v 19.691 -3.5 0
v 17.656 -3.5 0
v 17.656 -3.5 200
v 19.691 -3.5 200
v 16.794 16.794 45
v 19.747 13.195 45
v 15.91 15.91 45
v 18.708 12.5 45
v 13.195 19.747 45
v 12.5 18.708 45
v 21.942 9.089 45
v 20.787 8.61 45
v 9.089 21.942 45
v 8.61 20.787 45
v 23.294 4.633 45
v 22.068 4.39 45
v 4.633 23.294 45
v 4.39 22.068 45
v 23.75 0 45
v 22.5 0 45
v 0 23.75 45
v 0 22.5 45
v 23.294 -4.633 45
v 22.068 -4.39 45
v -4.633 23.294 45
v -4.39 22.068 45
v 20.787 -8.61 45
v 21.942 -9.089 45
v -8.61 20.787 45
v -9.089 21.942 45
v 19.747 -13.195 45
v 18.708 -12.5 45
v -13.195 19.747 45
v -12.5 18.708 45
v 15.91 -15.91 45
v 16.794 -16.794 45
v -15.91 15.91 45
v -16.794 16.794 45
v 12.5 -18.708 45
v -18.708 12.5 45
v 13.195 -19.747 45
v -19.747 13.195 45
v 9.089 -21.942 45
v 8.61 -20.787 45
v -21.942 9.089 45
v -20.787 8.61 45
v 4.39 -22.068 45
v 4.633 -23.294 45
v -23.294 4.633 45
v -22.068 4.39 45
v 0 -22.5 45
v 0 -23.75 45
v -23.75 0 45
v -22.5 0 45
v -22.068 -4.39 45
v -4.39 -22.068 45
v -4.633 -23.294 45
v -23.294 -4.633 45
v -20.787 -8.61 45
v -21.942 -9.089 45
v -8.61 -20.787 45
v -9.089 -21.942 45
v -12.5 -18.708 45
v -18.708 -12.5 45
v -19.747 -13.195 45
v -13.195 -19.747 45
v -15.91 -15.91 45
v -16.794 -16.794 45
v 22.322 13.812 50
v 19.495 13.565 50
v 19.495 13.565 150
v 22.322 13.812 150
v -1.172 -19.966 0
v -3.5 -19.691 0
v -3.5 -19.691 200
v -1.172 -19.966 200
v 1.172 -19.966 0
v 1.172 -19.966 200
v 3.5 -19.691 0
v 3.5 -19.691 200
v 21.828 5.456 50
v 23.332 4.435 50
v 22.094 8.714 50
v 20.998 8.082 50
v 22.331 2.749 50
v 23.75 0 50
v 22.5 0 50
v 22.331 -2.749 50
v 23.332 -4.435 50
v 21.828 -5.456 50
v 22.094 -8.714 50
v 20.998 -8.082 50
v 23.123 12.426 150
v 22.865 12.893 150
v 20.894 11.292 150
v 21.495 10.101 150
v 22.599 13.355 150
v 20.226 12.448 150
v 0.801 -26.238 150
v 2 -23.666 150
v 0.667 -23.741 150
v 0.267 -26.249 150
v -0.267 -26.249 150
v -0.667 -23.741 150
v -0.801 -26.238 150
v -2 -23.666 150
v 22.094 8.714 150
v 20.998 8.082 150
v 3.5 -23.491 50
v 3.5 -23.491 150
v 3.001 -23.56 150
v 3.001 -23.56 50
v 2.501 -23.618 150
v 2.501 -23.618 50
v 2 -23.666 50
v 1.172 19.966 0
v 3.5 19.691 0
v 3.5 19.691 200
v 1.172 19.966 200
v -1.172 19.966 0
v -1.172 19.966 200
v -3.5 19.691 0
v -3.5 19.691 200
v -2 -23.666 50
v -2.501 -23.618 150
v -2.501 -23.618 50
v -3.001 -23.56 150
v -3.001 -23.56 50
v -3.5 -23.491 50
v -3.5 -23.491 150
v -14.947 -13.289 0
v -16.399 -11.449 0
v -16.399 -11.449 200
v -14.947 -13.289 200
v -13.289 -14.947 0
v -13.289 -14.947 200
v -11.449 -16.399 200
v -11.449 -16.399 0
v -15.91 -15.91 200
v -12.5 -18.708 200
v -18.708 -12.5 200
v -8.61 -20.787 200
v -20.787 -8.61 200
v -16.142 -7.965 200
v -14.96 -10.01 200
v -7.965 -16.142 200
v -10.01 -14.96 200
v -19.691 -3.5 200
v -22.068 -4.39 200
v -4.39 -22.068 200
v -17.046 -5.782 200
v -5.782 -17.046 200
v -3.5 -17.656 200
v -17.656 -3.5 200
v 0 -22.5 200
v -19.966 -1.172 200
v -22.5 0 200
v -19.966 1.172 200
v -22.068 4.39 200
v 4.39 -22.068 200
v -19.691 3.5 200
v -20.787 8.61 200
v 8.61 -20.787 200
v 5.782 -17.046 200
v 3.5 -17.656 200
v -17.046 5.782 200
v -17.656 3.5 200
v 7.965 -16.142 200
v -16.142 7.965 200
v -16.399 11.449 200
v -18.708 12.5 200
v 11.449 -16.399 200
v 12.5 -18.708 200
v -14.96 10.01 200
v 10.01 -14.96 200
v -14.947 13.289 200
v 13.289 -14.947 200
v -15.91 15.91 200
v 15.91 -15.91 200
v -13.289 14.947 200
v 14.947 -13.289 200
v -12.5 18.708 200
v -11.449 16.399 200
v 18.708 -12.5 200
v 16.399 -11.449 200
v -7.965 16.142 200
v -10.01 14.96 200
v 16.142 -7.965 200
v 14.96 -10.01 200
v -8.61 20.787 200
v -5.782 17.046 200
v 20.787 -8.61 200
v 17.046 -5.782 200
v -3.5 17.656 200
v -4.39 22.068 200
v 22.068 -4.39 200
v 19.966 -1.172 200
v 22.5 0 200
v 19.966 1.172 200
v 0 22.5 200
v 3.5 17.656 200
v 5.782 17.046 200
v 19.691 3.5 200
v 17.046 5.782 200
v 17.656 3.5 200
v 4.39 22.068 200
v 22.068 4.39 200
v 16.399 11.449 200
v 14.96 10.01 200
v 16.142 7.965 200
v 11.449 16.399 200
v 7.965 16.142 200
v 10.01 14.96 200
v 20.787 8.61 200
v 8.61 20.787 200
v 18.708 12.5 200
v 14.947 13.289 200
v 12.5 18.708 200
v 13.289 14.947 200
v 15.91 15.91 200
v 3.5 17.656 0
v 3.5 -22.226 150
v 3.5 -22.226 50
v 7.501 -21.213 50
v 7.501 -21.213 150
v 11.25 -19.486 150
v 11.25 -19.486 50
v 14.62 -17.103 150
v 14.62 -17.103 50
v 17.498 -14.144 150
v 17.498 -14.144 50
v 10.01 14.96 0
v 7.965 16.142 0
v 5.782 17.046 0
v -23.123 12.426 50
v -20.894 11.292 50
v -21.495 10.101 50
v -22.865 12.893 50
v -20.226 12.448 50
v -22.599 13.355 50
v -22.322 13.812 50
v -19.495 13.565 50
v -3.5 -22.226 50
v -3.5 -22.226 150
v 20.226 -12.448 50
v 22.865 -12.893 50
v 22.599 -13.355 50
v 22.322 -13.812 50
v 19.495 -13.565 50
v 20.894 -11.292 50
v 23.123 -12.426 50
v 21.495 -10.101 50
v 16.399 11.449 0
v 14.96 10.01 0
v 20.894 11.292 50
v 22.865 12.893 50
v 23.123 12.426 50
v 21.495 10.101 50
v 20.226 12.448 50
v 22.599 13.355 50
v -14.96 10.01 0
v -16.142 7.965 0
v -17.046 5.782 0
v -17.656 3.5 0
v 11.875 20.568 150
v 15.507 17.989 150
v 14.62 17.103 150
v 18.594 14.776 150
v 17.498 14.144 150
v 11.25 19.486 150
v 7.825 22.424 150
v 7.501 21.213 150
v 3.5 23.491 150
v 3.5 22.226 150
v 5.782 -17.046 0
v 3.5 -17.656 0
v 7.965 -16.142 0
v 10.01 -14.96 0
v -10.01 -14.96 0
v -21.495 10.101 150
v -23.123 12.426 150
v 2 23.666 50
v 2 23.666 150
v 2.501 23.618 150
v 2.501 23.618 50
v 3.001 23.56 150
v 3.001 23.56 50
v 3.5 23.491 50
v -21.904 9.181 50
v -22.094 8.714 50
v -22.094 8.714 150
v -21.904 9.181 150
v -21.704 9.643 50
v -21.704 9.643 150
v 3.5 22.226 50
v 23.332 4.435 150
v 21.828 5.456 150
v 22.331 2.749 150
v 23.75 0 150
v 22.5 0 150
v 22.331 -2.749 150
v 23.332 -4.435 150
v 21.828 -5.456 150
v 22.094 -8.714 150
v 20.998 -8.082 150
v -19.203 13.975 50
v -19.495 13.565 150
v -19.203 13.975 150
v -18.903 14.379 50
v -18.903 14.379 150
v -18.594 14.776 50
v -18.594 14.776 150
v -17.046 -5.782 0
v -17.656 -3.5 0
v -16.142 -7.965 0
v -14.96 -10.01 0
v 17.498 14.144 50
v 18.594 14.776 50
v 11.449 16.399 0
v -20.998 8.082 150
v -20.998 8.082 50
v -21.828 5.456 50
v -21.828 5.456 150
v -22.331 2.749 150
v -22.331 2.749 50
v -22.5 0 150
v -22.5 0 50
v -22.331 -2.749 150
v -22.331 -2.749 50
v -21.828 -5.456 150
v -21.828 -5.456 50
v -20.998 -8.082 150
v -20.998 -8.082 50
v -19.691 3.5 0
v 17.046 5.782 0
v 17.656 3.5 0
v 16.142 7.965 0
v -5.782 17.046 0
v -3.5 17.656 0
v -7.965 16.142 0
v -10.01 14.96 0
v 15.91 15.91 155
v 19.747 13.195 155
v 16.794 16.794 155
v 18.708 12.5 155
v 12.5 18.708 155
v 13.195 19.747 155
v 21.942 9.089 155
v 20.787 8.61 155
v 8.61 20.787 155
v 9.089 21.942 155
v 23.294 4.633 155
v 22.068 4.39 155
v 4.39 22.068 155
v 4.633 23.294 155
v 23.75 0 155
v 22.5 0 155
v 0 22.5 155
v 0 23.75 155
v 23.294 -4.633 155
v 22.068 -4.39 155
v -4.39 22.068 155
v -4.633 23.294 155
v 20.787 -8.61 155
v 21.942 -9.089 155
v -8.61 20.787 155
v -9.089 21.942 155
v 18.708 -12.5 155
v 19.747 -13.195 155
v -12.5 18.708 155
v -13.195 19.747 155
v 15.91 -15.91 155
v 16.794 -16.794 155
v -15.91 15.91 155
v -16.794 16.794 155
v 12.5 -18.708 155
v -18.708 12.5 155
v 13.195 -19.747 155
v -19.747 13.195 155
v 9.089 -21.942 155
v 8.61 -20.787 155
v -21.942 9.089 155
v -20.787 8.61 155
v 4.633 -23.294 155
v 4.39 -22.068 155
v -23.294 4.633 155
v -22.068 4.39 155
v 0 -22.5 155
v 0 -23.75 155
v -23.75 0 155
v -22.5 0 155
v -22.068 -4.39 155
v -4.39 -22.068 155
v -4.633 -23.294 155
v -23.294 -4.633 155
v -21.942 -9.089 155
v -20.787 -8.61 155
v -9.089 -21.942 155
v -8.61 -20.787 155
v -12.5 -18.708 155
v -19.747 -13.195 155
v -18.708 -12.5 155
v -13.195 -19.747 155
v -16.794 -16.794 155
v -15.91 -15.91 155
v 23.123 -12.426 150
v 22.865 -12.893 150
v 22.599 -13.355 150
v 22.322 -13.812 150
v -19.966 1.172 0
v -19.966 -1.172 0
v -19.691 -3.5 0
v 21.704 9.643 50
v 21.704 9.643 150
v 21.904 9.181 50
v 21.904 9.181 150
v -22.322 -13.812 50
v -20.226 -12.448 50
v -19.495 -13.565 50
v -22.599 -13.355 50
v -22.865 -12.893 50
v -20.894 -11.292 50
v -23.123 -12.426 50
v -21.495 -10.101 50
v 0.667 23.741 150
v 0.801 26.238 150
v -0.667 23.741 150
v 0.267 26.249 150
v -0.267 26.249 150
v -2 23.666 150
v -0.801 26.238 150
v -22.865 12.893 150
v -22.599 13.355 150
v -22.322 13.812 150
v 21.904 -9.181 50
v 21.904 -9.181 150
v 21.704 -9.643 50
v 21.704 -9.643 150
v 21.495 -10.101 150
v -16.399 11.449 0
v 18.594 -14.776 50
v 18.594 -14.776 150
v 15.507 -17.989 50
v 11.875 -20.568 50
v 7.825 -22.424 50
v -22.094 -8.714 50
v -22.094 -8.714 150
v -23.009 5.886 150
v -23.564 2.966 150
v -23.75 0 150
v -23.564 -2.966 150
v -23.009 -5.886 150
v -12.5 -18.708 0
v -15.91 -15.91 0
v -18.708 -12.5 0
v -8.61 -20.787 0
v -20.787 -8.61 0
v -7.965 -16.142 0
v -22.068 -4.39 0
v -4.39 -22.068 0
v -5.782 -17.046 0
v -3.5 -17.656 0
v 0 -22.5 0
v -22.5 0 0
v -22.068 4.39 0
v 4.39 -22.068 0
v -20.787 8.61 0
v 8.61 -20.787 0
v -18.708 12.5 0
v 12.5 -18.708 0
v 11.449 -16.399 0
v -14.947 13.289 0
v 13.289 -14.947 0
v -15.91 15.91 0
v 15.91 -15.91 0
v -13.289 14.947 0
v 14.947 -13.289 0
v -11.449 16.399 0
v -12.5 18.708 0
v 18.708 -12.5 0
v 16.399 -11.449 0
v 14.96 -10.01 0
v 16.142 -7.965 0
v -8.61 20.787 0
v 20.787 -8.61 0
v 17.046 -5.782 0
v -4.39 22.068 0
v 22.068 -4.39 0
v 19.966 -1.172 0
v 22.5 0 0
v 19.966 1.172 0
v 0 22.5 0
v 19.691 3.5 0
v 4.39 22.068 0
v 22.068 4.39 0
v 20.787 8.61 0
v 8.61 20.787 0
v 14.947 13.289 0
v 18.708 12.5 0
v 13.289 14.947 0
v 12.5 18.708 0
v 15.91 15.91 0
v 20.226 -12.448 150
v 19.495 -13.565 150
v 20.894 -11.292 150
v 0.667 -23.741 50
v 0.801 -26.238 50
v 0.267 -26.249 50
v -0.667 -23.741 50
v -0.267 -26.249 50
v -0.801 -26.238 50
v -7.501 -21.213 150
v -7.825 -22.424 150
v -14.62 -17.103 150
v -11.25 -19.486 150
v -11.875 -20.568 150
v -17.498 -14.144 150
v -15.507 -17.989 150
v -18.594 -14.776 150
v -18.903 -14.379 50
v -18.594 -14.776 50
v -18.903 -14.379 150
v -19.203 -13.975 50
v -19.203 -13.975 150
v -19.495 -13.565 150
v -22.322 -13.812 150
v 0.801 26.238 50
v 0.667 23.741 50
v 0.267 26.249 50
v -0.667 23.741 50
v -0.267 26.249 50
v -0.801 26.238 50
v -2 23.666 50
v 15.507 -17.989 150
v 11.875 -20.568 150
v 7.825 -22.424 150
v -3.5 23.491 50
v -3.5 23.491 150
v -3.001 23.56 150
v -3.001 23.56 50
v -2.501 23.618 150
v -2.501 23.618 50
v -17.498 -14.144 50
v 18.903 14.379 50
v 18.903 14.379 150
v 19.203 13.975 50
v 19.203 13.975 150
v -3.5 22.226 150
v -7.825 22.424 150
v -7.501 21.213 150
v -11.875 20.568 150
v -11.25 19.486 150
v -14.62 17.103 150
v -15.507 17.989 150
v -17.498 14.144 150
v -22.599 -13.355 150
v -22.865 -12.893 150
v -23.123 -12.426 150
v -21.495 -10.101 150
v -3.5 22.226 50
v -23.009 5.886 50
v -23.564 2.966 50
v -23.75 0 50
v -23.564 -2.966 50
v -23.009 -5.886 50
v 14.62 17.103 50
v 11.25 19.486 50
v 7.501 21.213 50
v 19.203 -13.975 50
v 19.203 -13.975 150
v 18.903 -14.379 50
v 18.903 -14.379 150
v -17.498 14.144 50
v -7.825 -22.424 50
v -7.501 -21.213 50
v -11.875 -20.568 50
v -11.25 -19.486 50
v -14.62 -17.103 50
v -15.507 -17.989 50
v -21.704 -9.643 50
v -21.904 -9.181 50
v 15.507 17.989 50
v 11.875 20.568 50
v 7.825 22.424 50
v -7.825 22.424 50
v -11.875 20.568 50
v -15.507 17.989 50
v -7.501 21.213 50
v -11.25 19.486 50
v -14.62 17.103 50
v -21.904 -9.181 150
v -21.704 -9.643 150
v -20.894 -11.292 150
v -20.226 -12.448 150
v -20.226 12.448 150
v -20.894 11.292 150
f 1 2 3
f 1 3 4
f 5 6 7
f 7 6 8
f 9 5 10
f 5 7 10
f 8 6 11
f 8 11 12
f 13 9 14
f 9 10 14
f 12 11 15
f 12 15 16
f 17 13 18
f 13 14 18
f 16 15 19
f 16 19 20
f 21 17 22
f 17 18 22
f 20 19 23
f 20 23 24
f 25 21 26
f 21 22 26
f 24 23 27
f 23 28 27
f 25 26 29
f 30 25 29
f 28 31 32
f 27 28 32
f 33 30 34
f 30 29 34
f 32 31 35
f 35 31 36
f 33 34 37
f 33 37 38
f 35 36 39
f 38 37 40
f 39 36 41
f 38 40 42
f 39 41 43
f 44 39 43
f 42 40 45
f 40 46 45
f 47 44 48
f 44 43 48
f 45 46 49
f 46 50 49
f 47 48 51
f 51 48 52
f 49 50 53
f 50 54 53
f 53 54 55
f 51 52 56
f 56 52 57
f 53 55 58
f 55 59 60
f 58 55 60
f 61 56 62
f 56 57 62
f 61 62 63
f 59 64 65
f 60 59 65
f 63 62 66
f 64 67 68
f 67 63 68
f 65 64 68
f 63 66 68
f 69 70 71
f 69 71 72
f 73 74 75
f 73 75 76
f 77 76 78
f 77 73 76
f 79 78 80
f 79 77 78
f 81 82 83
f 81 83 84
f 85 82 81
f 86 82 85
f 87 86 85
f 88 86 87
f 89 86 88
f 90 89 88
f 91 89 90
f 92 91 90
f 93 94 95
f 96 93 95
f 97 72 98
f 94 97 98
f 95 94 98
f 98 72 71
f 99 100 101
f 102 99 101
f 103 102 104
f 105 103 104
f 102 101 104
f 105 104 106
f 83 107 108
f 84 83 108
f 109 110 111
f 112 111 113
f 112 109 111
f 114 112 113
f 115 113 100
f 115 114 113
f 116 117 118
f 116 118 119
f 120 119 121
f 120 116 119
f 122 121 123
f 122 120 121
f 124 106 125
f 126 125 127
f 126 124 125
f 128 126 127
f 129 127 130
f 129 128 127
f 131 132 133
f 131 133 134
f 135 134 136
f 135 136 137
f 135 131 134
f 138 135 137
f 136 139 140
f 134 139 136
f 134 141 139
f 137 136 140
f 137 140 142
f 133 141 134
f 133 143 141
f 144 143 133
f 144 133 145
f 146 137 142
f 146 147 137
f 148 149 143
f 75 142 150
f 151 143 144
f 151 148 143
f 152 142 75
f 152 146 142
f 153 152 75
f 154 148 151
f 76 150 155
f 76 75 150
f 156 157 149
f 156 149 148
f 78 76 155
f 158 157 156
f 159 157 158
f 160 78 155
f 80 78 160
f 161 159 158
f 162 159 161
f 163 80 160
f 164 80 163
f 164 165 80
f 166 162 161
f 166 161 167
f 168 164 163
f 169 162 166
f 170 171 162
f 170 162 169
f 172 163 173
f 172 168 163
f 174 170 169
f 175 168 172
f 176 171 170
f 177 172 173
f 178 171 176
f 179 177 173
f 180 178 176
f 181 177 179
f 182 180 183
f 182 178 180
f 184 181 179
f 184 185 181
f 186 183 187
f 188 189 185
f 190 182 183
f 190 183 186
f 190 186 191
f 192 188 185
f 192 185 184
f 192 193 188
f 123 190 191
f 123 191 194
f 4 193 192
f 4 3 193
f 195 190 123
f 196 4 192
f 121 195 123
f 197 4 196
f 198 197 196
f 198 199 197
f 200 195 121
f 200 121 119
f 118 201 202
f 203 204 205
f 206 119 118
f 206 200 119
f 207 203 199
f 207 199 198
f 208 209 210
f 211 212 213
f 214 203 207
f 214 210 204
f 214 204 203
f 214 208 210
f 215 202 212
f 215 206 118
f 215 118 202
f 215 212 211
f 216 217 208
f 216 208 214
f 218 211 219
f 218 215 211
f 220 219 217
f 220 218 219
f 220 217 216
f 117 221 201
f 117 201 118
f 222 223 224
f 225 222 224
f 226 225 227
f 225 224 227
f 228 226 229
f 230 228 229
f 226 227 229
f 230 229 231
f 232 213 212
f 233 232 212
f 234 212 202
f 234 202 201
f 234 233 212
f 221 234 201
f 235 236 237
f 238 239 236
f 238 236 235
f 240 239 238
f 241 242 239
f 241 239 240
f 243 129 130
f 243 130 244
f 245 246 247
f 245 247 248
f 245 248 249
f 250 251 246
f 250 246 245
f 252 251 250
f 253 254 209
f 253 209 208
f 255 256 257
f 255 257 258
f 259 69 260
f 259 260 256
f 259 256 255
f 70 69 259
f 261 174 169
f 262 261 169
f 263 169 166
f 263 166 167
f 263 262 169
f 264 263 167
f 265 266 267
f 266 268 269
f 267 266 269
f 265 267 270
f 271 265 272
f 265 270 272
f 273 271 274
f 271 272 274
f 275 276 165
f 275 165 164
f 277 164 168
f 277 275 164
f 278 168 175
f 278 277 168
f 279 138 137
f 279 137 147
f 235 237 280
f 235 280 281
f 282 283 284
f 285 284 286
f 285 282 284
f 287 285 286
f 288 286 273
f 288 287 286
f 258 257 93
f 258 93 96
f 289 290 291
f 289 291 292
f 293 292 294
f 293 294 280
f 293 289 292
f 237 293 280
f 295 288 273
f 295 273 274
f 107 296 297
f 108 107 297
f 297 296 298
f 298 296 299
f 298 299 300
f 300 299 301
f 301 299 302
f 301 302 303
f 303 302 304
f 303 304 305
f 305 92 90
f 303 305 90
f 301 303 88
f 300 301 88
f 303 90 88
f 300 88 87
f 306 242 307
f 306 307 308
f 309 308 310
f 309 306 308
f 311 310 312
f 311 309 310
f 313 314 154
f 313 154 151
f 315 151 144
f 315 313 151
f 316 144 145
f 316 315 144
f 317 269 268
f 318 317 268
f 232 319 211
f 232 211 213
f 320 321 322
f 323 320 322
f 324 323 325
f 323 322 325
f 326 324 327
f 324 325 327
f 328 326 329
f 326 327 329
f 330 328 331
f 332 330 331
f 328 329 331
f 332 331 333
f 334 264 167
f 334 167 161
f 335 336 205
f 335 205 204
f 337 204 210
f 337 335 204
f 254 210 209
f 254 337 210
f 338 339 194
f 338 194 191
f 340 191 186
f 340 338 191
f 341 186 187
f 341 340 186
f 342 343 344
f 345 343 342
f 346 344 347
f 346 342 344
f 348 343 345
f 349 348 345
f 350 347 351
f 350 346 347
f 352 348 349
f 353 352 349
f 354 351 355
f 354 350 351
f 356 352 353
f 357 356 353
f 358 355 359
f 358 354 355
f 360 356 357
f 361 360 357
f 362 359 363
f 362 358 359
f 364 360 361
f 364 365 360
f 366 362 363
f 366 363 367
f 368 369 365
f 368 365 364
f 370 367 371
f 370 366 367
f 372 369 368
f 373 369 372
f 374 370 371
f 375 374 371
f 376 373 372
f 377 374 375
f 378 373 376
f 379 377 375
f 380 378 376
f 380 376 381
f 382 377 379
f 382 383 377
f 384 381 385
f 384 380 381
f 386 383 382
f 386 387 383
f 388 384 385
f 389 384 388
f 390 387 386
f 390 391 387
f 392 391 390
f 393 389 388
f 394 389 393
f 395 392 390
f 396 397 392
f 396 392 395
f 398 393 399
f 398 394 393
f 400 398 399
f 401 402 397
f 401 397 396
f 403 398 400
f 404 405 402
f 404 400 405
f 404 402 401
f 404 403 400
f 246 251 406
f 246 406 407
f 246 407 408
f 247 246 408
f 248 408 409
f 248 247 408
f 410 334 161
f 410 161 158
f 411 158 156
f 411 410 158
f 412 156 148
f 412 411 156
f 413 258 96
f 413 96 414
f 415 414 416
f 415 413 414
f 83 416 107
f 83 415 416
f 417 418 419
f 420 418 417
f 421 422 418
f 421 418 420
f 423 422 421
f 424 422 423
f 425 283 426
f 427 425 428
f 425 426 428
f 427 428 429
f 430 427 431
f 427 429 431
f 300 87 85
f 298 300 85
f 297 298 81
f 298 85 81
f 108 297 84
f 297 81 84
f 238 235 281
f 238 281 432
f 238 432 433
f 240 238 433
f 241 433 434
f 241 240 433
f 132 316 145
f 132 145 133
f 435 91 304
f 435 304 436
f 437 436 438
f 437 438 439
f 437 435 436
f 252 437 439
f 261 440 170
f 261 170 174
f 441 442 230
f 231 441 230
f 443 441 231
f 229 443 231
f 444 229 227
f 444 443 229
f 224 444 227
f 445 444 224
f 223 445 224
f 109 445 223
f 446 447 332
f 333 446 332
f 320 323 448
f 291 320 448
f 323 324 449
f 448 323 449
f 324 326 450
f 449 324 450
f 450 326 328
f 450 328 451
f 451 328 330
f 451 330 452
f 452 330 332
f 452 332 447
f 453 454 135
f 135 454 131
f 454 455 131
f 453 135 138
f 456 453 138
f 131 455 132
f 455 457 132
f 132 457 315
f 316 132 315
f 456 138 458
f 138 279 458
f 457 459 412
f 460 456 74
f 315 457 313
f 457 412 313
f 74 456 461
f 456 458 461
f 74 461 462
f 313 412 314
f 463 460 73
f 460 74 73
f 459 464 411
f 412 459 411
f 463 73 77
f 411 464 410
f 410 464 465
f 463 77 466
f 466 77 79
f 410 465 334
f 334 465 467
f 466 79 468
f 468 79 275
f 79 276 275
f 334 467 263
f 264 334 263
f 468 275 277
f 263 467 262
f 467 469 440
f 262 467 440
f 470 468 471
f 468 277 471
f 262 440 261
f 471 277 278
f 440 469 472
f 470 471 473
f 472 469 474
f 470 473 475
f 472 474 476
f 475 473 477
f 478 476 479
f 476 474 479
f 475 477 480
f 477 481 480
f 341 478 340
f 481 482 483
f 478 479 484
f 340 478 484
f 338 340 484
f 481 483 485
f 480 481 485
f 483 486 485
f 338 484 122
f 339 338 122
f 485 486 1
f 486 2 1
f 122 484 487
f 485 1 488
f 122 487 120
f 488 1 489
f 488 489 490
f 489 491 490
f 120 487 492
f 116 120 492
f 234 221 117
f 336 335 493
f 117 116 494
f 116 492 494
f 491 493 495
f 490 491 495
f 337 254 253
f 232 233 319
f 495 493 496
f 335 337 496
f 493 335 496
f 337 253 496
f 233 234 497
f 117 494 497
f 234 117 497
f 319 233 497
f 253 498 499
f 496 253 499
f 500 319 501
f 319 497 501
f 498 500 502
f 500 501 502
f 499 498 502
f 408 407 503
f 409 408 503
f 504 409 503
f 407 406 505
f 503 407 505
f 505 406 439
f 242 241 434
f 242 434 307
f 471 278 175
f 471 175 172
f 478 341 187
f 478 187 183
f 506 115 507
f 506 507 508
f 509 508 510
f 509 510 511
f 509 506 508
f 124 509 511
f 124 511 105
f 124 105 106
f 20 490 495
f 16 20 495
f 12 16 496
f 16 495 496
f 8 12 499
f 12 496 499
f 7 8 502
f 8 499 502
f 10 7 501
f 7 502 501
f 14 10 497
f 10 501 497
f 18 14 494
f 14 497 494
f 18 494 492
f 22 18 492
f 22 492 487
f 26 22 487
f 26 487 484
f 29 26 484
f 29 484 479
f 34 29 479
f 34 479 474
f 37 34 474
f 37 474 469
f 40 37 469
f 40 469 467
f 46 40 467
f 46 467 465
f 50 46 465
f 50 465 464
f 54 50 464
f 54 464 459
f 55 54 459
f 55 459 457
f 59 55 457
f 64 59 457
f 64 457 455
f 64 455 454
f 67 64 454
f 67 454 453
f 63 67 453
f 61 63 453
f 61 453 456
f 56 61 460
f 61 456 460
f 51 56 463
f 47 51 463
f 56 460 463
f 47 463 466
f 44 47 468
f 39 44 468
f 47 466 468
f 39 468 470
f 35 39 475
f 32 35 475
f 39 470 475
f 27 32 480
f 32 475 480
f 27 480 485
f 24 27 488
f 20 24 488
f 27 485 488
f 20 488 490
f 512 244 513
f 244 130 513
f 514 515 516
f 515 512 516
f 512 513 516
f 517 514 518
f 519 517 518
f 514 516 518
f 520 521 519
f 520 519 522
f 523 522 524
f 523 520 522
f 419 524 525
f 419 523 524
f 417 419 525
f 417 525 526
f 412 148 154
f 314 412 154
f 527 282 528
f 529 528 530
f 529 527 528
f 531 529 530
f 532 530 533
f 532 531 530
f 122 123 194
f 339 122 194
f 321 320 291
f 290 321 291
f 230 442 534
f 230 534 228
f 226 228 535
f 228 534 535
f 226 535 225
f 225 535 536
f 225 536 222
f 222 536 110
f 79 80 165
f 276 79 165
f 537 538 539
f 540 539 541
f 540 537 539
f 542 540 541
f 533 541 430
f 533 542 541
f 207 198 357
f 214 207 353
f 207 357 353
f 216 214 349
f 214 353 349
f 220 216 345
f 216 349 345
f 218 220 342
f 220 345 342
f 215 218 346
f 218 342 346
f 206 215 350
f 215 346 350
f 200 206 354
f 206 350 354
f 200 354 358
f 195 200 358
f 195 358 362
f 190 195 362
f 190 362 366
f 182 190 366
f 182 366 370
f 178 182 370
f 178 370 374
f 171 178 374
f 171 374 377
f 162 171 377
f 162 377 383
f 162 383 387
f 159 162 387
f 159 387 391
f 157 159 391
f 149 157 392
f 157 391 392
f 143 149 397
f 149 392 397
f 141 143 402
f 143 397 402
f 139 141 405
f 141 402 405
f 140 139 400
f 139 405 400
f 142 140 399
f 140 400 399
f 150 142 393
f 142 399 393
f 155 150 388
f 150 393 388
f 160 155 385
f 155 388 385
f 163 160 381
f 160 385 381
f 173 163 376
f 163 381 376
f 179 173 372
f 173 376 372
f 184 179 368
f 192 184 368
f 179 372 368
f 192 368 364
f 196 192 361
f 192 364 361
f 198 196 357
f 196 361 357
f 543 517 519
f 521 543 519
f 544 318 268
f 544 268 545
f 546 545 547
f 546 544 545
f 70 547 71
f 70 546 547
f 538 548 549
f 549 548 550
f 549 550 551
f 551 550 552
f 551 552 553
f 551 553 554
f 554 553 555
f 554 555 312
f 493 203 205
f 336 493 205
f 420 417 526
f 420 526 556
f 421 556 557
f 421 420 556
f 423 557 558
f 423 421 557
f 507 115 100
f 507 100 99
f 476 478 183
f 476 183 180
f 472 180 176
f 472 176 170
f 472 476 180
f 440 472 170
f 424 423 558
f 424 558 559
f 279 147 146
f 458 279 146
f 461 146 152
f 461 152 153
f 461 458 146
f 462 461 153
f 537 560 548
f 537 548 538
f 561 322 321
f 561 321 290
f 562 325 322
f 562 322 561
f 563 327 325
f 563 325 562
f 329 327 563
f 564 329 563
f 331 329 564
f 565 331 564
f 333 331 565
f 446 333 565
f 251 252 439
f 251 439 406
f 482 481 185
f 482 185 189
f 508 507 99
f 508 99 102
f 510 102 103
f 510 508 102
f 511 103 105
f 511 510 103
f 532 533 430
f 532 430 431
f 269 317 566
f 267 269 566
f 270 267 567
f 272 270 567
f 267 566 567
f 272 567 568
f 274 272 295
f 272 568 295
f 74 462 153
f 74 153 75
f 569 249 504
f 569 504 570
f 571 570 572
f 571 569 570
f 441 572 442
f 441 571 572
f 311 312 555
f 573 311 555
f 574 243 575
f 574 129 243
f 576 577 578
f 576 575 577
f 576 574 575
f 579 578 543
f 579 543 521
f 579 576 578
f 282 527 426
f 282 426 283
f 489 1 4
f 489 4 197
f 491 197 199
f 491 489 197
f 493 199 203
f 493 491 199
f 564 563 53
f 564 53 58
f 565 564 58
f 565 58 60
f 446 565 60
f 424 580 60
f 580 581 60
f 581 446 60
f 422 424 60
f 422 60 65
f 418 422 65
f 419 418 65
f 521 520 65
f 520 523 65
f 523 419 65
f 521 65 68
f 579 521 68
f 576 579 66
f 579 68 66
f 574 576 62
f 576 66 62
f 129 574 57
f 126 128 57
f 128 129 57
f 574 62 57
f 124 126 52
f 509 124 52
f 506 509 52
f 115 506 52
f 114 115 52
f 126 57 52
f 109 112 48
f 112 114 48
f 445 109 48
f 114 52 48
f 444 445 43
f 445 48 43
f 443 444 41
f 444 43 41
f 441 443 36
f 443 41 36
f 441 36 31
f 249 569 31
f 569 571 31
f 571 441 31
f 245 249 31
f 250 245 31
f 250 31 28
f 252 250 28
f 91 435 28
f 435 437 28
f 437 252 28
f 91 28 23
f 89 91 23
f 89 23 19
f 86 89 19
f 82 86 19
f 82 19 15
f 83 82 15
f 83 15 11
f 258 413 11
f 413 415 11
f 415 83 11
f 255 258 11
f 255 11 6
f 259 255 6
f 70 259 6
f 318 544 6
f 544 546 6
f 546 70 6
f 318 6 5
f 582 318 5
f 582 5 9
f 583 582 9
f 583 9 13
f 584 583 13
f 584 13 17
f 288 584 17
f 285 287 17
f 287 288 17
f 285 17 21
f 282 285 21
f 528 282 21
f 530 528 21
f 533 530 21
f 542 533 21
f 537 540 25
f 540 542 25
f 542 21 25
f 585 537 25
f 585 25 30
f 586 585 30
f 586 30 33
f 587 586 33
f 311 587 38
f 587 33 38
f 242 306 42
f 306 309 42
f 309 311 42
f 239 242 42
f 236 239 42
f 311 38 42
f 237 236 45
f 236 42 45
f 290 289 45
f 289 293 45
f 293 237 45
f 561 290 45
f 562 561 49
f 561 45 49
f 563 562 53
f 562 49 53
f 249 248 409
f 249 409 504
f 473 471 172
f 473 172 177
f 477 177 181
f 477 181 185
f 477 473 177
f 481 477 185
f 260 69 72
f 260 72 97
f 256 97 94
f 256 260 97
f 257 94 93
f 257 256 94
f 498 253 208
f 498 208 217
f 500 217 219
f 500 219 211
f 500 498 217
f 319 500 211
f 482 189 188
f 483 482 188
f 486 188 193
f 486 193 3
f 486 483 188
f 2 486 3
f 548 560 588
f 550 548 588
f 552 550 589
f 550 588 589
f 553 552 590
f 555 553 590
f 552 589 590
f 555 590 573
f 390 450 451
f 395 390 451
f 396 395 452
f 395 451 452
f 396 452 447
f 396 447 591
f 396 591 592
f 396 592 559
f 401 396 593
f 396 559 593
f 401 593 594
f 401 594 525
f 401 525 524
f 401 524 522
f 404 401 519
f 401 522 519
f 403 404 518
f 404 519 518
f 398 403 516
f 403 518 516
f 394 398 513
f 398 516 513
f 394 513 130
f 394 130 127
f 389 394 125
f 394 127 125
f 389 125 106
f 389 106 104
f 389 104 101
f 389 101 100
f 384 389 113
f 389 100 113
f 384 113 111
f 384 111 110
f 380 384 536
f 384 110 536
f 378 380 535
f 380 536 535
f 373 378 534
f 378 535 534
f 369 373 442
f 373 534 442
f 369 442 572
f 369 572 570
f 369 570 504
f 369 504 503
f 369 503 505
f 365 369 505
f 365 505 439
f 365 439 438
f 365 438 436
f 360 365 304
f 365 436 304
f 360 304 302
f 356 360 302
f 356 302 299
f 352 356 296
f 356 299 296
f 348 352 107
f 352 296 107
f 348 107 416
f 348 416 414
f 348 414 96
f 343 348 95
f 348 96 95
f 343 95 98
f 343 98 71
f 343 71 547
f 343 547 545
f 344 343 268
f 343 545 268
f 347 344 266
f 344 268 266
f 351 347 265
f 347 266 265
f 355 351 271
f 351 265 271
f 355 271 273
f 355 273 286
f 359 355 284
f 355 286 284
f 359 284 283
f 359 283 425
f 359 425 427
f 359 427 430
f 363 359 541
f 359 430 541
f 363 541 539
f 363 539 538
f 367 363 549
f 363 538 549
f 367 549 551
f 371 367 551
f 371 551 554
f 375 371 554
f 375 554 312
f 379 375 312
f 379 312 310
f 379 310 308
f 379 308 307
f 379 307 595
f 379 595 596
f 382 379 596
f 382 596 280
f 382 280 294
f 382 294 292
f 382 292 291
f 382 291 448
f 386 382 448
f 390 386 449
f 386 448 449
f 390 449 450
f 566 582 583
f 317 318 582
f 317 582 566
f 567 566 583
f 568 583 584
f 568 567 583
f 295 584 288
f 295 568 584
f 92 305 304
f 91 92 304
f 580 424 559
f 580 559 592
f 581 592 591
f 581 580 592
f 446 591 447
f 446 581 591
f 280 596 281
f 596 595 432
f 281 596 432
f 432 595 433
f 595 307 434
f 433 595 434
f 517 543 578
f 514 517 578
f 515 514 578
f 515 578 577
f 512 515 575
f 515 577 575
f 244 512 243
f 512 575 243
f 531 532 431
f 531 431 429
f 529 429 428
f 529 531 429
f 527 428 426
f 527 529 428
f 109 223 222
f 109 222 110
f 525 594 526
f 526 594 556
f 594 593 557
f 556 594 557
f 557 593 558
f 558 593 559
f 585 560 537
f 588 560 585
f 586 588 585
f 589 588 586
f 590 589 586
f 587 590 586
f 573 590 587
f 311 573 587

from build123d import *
from build123d.topology import SkipClean

# Parameters (mm, degrees)
SKETCH1_R           = 22.5
BOSS_EXTRUDE1_DEPTH = 200
BOSS_EXTRUDE2_START = 50
BOSS_EXTRUDE2_DEPTH = 100
BOSS_EXTRUDE3_START = -50
SKETCH4_R           = 23.75
SKETCH4_R_2         = 22.5
BOSS_EXTRUDE3_DEPTH = 5
BOSS_EXTRUDE4_START = -155
SKETCH4_2_R         = 23.75
SKETCH4_2_R_2       = 22.5
BOSS_EXTRUDE4_DEPTH = 5


with BuildPart() as part:
    # Sketch1 → Boss-Extrude1 (new body)
    with BuildSketch(Plane.XY):
        Circle(SKETCH1_R)
        with BuildLine():
            Line((-3.5, 19.691368668), (-3.5, 17.656443583))
            ThreePointArc((-3.5, 17.656443583), (-6.888301783, 16.629831585), (-10.010117255, 14.959864723))
            Line((-10.010117255, 14.959864723), (-11.449026581, 16.39877405))
            ThreePointArc((-11.449026581, 16.39877405), (-14.142135624, 14.142135624), (-16.39877405, 11.449026581))
            Line((-16.39877405, 11.449026581), (-14.959864723, 10.010117255))
            ThreePointArc((-14.959864723, 10.010117255), (-16.629831585, 6.888301783), (-17.656443583, 3.5))
            Line((-17.656443583, 3.5), (-19.691368668, 3.5))
            ThreePointArc((-19.691368668, 3.5), (-20, 0), (-19.691368668, -3.5))
            Line((-19.691368668, -3.5), (-17.656443583, -3.5))
            ThreePointArc((-17.656443583, -3.5), (-16.629831585, -6.888301783), (-14.959864723, -10.010117255))
            Line((-14.959864723, -10.010117255), (-16.39877405, -11.449026581))
            ThreePointArc((-16.39877405, -11.449026581), (-14.142135624, -14.142135624), (-11.449026581, -16.39877405))
            Line((-11.449026581, -16.39877405), (-10.010117255, -14.959864723))
            ThreePointArc((-10.010117255, -14.959864723), (-6.888301783, -16.629831585), (-3.5, -17.656443583))
            Line((-3.5, -17.656443583), (-3.5, -19.691368668))
            ThreePointArc((-3.5, -19.691368668), (0, -20), (3.5, -19.691368668))
            Line((3.5, -19.691368668), (3.5, -17.656443583))
            ThreePointArc((3.5, -17.656443583), (6.888301783, -16.629831585), (10.010117255, -14.959864723))
            Line((10.010117255, -14.959864723), (11.449026581, -16.39877405))
            ThreePointArc((11.449026581, -16.39877405), (14.142135624, -14.142135624), (16.39877405, -11.449026581))
            Line((16.39877405, -11.449026581), (14.959864723, -10.010117255))
            ThreePointArc((14.959864723, -10.010117255), (16.629831585, -6.888301783), (17.656443583, -3.5))
            Line((17.656443583, -3.5), (19.691368668, -3.5))
            ThreePointArc((19.691368668, -3.5), (20, 0), (19.691368668, 3.5))
            Line((19.691368668, 3.5), (17.656443583, 3.5))
            ThreePointArc((17.656443583, 3.5), (16.629831585, 6.888301783), (14.959864723, 10.010117255))
            Line((14.959864723, 10.010117255), (16.39877405, 11.449026581))
            ThreePointArc((16.39877405, 11.449026581), (14.142135624, 14.142135624), (11.449026581, 16.39877405))
            Line((11.449026581, 16.39877405), (10.010117255, 14.959864723))
            ThreePointArc((10.010117255, 14.959864723), (6.888301783, 16.629831585), (3.5, 17.656443583))
            Line((3.5, 17.656443583), (3.5, 19.691368668))
            ThreePointArc((3.5, 19.691368668), (0, 20), (-3.5, 19.691368668))
        make_face(mode=Mode.SUBTRACT)
    extrude(amount=BOSS_EXTRUDE1_DEPTH)

    # Sketch3 → Boss-Extrude2 (add)
    with BuildSketch(Plane.XY.offset(BOSS_EXTRUDE2_START)):
        with BuildLine():
            Line((-2, 23.665639649), (-0.800587161, 26.237788783))
            ThreePointArc((-0.800587161, 26.237788783), (0, 26.25), (0.800587161, 26.237788783))
            Line((0.800587161, 26.237788783), (2, 23.665639649))
            ThreePointArc((2, 23.665639649), (2.751390898, 23.590090041), (3.5, 23.490689645))
            Line((3.5, 23.490689645), (3.5, 22.226110771))
            ThreePointArc((3.5, 22.226110771), (0, 22.5), (-3.5, 22.226110771))
            Line((-3.5, 22.226110771), (-3.5, 23.490689645))
            ThreePointArc((-3.5, 23.490689645), (-2.751390898, 23.590090041), (-2, 23.665639649))
        make_face()
        with BuildLine():
            Line((17.498376555, 14.144144299), (18.593533985, 14.776433736))
            ThreePointArc((18.593533985, 14.776433736), (19.053921804, 14.177819434), (19.495045133, 13.564870632))
            Line((19.495045133, 13.564870632), (22.322298044, 13.812223211))
            ThreePointArc((22.322298044, 13.812223211), (22.733166849, 13.125), (23.122885205, 12.425565572))
            Line((23.122885205, 12.425565572), (21.495045133, 10.100769017))
            ThreePointArc((21.495045133, 10.100769017), (21.805312702, 9.412270607), (22.093533985, 8.714255909))
            Line((22.093533985, 8.714255909), (20.998376555, 8.081966472))
            ThreePointArc((20.998376555, 8.081966472), (19.485571585, 11.25), (17.498376555, 14.144144299))
        make_face()
        with BuildLine():
            Line((20.998376555, -8.081966472), (22.093533985, -8.714255909))
            ThreePointArc((22.093533985, -8.714255909), (21.805312702, -9.412270607), (21.495045133, -10.100769017))
            Line((21.495045133, -10.100769017), (23.122885205, -12.425565572))
            ThreePointArc((23.122885205, -12.425565572), (22.733166849, -13.125), (22.322298044, -13.812223211))
            Line((22.322298044, -13.812223211), (19.495045133, -13.564870632))
            ThreePointArc((19.495045133, -13.564870632), (19.053921804, -14.177819434), (18.593533985, -14.776433736))
            Line((18.593533985, -14.776433736), (17.498376555, -14.144144299))
            ThreePointArc((17.498376555, -14.144144299), (19.485571585, -11.25), (20.998376555, -8.081966472))
        make_face()
        with BuildLine():
            Line((3.5, -22.226110771), (3.5, -23.490689645))
            ThreePointArc((3.5, -23.490689645), (2.751390898, -23.590090041), (2, -23.665639649))
            Line((2, -23.665639649), (0.800587161, -26.237788783))
            ThreePointArc((0.800587161, -26.237788783), (0, -26.25), (-0.800587161, -26.237788783))
            Line((-0.800587161, -26.237788783), (-2, -23.665639649))
            ThreePointArc((-2, -23.665639649), (-2.751390898, -23.590090041), (-3.5, -23.490689645))
            Line((-3.5, -23.490689645), (-3.5, -22.226110771))
            ThreePointArc((-3.5, -22.226110771), (0, -22.5), (3.5, -22.226110771))
        make_face()
        with BuildLine():
            Line((-17.498376555, -14.144144299), (-18.593533985, -14.776433736))
            ThreePointArc((-18.593533985, -14.776433736), (-19.053921804, -14.177819434), (-19.495045133, -13.564870632))
            Line((-19.495045133, -13.564870632), (-22.322298044, -13.812223211))
            ThreePointArc((-22.322298044, -13.812223211), (-22.733166849, -13.125), (-23.122885205, -12.425565572))
            Line((-23.122885205, -12.425565572), (-21.495045133, -10.100769017))
            ThreePointArc((-21.495045133, -10.100769017), (-21.805312702, -9.412270607), (-22.093533985, -8.714255909))
            Line((-22.093533985, -8.714255909), (-20.998376555, -8.081966472))
            ThreePointArc((-20.998376555, -8.081966472), (-19.485571585, -11.25), (-17.498376555, -14.144144299))
        make_face()
        with BuildLine():
            Line((-20.998376555, 8.081966472), (-22.093533985, 8.714255909))
            ThreePointArc((-22.093533985, 8.714255909), (-21.805312702, 9.412270607), (-21.495045133, 10.100769017))
            Line((-21.495045133, 10.100769017), (-23.122885205, 12.425565572))
            ThreePointArc((-23.122885205, 12.425565572), (-22.733166849, 13.125), (-22.322298044, 13.812223211))
            Line((-22.322298044, 13.812223211), (-19.495045133, 13.564870632))
            ThreePointArc((-19.495045133, 13.564870632), (-19.053921804, 14.177819434), (-18.593533985, 14.776433736))
            Line((-18.593533985, 14.776433736), (-17.498376555, 14.144144299))
            ThreePointArc((-17.498376555, 14.144144299), (-19.485571585, 11.25), (-20.998376555, 8.081966472))
        make_face()
    extrude(amount=BOSS_EXTRUDE2_DEPTH)

    # Sketch4 → Boss-Extrude3 (add)
    with SkipClean():  # the faces are left unmerged after this step: merging them gives an invalid solid
        with BuildSketch(Plane.XY.offset(200).offset(BOSS_EXTRUDE3_START)):
            with Locations(Location((0, 0, 0), (0, 0, 180))):
                Circle(SKETCH4_R)
            with Locations(Location((0, 0, 0), (0, 0, 180))):
                Circle(SKETCH4_R_2, mode=Mode.SUBTRACT)
        extrude(amount=BOSS_EXTRUDE3_DEPTH)

    # Sketch4<2> → Boss-Extrude4 (add)
    with SkipClean():  # the faces are left unmerged after this step: merging them gives an invalid solid
        with BuildSketch(Plane.XY.offset(200).offset(BOSS_EXTRUDE4_START)):
            with Locations(Location((0, 0, 0), (0, 0, 180))):
                Circle(SKETCH4_2_R)
            with Locations(Location((0, 0, 0), (0, 0, 180))):
                Circle(SKETCH4_2_R_2, mode=Mode.SUBTRACT)
        extrude(amount=BOSS_EXTRUDE4_DEPTH)


solid = part.part
